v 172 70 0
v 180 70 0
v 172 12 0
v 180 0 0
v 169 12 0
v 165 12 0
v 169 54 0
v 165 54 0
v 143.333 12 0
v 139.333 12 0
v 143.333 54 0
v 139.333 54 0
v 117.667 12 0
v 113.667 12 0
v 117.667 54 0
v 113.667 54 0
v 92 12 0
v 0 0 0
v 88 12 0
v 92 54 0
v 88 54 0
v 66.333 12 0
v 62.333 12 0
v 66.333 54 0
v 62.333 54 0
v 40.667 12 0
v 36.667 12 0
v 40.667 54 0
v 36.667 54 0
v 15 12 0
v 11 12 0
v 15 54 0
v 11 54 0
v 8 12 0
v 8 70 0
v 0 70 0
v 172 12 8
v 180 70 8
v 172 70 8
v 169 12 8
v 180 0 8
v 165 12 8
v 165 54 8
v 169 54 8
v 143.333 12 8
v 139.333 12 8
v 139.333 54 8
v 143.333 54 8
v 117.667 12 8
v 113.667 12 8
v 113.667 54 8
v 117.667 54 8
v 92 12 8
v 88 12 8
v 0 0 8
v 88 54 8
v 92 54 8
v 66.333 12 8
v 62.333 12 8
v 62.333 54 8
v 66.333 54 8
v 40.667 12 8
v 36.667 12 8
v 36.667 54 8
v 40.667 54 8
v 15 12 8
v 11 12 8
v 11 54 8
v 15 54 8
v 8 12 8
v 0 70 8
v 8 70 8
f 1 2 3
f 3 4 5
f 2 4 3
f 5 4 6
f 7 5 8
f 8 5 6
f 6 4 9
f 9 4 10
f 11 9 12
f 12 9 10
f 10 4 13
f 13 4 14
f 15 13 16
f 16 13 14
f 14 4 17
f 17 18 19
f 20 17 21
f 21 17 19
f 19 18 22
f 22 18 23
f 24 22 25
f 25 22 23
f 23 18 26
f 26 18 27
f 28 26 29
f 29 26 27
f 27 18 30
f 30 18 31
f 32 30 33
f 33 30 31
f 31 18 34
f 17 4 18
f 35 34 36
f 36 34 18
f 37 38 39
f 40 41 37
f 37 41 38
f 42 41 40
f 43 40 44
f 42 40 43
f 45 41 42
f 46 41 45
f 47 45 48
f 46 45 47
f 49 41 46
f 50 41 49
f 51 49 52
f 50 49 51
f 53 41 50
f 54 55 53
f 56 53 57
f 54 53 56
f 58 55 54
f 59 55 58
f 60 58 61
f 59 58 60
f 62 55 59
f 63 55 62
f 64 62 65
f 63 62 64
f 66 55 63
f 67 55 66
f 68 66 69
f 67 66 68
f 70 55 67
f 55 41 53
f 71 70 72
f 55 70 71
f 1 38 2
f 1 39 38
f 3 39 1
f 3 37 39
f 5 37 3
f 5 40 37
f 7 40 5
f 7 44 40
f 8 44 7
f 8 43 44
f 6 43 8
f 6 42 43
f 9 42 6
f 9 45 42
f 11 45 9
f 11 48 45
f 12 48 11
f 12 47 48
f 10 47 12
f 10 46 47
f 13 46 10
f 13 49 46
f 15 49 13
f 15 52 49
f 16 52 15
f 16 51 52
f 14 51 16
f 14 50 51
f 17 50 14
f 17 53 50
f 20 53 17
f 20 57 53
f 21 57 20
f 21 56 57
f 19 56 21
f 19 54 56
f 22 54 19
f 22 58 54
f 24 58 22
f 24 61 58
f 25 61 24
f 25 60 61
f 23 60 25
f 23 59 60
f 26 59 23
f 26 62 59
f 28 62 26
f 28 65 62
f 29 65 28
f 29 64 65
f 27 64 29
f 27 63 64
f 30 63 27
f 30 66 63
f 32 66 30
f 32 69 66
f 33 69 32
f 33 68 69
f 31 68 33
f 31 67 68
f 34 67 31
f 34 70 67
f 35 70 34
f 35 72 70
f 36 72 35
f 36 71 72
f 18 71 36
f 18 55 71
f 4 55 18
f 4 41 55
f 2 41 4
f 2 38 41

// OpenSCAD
$fn = 32;

// ----------------------------------------------------------------------
// Guard grille: 7 slats over a 180 x 70 mm plate
// ----------------------------------------------------------------------

// --- parameters (mm) ---
profile_height = 8;       // extrusion height
profile_points = 36;      // points of the closed outline

profile = [[0, 0], [180, 0], [180, 70], [172, 70], [172, 12], [169, 12], [169, 54], [165, 54], [165, 12], [143.333, 12], [143.333, 54], [139.333, 54], [139.333, 12], [117.667, 12], [117.667, 54], [113.667, 54], [113.667, 12], [92, 12], [92, 54], [88, 54], [88, 12], [66.333, 12], [66.333, 54], [62.333, 54], [62.333, 12], [40.667, 12], [40.667, 54], [36.667, 54], [36.667, 12], [15, 12], [15, 54], [11, 54], [11, 12], [8, 12], [8, 70], [0, 70]];  // single closed polygon, 36 points, counter clockwise

// --- the one profile operation ---
linear_extrude(height = profile_height) polygon(points = profile);
